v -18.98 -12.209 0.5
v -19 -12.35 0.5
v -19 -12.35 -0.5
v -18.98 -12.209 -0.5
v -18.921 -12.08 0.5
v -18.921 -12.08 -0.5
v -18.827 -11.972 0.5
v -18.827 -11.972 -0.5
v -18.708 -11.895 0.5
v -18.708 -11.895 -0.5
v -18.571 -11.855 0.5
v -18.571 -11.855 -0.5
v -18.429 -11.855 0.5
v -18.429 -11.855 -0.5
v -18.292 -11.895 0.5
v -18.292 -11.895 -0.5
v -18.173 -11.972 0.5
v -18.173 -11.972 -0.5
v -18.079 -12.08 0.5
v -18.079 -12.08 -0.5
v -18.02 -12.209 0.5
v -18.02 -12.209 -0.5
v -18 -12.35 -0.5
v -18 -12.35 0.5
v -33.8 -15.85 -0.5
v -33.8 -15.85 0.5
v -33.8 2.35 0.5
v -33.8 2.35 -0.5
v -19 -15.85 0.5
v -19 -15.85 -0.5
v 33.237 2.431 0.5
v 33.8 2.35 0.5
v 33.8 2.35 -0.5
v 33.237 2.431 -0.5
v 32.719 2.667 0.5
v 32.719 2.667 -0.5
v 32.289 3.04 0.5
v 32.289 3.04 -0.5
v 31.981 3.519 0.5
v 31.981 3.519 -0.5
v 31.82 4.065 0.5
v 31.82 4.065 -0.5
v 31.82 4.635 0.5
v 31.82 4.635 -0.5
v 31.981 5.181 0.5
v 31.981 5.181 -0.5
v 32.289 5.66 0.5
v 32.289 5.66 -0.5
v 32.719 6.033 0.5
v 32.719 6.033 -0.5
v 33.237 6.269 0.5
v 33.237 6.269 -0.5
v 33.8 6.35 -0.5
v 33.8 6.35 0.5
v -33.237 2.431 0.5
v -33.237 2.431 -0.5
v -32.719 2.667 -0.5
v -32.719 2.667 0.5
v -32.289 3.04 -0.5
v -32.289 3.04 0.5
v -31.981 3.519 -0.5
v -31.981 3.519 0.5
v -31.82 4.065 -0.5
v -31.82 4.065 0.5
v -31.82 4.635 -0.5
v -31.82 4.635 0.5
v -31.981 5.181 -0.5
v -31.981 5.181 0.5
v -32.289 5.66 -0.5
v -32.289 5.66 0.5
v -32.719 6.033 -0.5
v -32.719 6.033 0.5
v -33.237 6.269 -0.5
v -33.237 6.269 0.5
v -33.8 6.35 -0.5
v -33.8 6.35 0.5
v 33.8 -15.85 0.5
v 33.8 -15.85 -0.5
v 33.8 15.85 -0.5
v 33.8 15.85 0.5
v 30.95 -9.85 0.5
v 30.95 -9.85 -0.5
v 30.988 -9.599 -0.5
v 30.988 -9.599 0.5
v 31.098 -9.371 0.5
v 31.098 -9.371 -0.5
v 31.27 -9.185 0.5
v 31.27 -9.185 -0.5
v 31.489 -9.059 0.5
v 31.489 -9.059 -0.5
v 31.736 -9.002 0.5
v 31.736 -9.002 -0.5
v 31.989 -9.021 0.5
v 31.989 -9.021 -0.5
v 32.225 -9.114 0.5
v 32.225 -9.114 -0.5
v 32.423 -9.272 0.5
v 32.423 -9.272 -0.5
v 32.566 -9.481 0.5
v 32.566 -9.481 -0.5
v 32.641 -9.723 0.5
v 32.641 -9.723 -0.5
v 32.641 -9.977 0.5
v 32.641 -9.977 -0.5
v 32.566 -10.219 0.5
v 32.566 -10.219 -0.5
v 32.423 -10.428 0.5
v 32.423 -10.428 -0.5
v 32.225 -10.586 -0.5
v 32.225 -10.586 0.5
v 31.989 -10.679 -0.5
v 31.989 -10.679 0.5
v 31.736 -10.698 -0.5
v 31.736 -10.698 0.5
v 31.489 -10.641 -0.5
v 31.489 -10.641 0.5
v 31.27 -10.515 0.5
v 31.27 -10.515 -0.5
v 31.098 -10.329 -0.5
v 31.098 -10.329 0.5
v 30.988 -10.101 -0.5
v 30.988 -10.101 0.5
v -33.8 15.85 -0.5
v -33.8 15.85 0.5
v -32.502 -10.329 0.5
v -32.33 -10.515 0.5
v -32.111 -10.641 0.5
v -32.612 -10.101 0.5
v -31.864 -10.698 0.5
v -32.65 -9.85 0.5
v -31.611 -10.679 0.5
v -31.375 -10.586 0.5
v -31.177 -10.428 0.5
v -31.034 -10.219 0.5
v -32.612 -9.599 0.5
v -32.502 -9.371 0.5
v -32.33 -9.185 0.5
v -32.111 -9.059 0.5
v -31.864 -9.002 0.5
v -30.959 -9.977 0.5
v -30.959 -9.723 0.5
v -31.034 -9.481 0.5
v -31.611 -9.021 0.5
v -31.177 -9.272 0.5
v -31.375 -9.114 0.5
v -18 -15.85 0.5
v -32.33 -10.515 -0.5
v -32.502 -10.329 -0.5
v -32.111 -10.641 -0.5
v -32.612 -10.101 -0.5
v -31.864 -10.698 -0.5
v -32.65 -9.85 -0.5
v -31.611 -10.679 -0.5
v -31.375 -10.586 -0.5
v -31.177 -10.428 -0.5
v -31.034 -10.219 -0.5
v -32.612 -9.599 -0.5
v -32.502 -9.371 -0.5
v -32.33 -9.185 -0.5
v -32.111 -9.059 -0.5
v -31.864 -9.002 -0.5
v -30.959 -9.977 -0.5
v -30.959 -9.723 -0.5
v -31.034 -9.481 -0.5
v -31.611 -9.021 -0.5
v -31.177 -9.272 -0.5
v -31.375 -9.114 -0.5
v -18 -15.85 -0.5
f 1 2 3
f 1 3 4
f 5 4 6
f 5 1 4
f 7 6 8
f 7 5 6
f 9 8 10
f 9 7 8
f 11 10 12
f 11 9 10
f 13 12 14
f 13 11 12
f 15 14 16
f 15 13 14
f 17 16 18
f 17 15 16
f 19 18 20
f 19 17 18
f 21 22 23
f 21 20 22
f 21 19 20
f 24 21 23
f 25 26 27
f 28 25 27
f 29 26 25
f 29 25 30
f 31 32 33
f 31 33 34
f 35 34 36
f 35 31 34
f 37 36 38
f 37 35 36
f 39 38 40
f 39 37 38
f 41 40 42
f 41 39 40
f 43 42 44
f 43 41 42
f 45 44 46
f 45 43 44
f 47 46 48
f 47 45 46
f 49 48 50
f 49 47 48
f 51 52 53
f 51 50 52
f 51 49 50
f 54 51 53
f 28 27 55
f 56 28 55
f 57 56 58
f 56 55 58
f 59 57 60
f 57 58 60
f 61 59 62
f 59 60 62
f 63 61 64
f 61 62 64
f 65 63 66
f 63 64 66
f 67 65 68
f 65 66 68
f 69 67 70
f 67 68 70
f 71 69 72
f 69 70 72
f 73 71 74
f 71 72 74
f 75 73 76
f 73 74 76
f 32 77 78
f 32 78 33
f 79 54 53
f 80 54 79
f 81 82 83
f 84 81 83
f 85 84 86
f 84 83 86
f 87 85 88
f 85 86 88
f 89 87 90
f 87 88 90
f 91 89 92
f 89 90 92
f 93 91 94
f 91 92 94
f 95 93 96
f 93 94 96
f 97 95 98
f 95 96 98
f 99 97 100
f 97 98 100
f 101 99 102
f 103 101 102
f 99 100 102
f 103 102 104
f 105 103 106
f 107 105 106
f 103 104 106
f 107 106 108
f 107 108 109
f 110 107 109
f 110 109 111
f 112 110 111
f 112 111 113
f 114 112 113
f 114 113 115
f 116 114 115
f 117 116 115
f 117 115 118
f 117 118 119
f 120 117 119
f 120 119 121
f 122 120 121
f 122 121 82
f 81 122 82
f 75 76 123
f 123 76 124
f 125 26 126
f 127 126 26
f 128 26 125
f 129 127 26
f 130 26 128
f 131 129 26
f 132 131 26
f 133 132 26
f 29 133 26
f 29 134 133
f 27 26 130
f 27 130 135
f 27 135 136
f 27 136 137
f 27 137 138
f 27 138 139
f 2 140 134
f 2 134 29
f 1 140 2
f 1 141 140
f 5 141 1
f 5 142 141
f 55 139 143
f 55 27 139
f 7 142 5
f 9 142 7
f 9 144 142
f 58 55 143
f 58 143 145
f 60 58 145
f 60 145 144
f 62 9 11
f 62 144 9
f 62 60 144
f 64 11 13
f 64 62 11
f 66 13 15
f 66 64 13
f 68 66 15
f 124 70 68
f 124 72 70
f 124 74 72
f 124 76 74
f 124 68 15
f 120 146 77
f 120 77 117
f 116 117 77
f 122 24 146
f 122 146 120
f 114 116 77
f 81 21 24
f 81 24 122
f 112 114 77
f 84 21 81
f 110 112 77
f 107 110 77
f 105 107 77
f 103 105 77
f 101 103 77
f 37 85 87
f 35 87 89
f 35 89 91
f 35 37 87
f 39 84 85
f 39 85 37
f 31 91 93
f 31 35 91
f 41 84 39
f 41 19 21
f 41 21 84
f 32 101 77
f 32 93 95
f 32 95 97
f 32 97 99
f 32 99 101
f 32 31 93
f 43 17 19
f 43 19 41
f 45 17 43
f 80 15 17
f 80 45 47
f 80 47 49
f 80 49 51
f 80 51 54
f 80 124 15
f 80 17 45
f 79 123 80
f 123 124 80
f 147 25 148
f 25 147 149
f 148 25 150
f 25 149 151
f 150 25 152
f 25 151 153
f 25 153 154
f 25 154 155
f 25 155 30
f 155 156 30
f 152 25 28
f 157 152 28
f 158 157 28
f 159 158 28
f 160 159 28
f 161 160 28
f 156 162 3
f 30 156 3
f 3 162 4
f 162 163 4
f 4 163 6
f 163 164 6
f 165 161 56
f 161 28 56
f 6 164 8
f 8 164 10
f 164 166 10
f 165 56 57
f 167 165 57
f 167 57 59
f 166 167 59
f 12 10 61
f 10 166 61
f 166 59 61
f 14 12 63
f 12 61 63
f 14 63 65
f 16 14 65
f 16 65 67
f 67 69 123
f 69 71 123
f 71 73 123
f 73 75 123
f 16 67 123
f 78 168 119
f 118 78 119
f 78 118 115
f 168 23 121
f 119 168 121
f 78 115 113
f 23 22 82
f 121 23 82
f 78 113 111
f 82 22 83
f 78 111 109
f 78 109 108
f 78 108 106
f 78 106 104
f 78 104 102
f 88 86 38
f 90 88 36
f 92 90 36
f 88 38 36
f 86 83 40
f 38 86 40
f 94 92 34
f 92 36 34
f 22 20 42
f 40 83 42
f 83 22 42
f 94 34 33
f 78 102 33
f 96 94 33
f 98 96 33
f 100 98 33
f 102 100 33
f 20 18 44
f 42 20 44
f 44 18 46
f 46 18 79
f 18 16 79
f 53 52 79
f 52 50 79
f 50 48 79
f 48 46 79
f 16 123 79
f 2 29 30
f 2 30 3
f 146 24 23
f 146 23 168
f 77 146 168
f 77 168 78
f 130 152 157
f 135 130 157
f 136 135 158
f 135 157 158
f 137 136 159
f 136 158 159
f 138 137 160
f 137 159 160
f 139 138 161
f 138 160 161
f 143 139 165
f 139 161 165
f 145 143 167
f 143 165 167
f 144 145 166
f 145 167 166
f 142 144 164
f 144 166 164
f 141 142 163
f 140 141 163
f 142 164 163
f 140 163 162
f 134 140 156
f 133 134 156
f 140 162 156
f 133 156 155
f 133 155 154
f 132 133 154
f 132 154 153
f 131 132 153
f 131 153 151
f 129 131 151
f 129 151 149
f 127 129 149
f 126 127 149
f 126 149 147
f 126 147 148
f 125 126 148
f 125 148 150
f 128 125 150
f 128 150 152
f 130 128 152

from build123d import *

# Parameters (mm, degrees)
SKETCH1_W                     = 67.6
SKETCH1_H                     = 31.7
MAIN_BOARD_DEPTH              = 0.5
MOUNTING_CLIP_GROOVES_DEPTH   = 38.345180412
M1_7_1_7_LOCATING_PIN_HOLES_D = 1.7
LOCATING_SLOT_DEPTH           = 38.345180412


with BuildPart() as part:
    # Sketch1 → MAIN BOARD (new, symmetric)
    with BuildSketch(Plane.XY):
        Rectangle(SKETCH1_W, SKETCH1_H)
    extrude(amount=MAIN_BOARD_DEPTH, both=True)

    # Sketch2 → MOUNTING CLIP GROOVES (cut, through all)
    with BuildSketch(Plane.XY.offset(0.5)):
        with BuildLine():
            Line((-33.8, 6.35), (-33.8, 2.35))
            ThreePointArc((-33.8, 2.35), (-31.8, 4.35), (-33.8, 6.35))
        make_face()
        with BuildLine():
            Line((33.8, 6.35), (33.8, 2.35))
            ThreePointArc((33.8, 2.35), (31.8, 4.35), (33.8, 6.35))
        make_face()
    extrude(amount=-MOUNTING_CLIP_GROOVES_DEPTH, mode=Mode.SUBTRACT)

    # M1.7 (1.7) LOCATING PIN HOLES (through all)
    with Locations(Plane.XY.offset(0.5)):
        with Locations((-31.8, -9.85), (31.8, -9.85)):
            Hole(M1_7_1_7_LOCATING_PIN_HOLES_D / 2)

    # Sketch5 → LOCATING SLOT (cut, through all)
    with BuildSketch(Plane.XY.offset(0.5)):
        with BuildLine():
            Line((-19, -15.85), (-19, -12.35))
            ThreePointArc((-19, -12.35), (-18.5, -11.85), (-18, -12.35))
            Line((-18, -12.35), (-18, -15.85))
            Line((-18, -15.85), (-19, -15.85))
        make_face()
    extrude(amount=-LOCATING_SLOT_DEPTH, mode=Mode.SUBTRACT)


solid = part.part
